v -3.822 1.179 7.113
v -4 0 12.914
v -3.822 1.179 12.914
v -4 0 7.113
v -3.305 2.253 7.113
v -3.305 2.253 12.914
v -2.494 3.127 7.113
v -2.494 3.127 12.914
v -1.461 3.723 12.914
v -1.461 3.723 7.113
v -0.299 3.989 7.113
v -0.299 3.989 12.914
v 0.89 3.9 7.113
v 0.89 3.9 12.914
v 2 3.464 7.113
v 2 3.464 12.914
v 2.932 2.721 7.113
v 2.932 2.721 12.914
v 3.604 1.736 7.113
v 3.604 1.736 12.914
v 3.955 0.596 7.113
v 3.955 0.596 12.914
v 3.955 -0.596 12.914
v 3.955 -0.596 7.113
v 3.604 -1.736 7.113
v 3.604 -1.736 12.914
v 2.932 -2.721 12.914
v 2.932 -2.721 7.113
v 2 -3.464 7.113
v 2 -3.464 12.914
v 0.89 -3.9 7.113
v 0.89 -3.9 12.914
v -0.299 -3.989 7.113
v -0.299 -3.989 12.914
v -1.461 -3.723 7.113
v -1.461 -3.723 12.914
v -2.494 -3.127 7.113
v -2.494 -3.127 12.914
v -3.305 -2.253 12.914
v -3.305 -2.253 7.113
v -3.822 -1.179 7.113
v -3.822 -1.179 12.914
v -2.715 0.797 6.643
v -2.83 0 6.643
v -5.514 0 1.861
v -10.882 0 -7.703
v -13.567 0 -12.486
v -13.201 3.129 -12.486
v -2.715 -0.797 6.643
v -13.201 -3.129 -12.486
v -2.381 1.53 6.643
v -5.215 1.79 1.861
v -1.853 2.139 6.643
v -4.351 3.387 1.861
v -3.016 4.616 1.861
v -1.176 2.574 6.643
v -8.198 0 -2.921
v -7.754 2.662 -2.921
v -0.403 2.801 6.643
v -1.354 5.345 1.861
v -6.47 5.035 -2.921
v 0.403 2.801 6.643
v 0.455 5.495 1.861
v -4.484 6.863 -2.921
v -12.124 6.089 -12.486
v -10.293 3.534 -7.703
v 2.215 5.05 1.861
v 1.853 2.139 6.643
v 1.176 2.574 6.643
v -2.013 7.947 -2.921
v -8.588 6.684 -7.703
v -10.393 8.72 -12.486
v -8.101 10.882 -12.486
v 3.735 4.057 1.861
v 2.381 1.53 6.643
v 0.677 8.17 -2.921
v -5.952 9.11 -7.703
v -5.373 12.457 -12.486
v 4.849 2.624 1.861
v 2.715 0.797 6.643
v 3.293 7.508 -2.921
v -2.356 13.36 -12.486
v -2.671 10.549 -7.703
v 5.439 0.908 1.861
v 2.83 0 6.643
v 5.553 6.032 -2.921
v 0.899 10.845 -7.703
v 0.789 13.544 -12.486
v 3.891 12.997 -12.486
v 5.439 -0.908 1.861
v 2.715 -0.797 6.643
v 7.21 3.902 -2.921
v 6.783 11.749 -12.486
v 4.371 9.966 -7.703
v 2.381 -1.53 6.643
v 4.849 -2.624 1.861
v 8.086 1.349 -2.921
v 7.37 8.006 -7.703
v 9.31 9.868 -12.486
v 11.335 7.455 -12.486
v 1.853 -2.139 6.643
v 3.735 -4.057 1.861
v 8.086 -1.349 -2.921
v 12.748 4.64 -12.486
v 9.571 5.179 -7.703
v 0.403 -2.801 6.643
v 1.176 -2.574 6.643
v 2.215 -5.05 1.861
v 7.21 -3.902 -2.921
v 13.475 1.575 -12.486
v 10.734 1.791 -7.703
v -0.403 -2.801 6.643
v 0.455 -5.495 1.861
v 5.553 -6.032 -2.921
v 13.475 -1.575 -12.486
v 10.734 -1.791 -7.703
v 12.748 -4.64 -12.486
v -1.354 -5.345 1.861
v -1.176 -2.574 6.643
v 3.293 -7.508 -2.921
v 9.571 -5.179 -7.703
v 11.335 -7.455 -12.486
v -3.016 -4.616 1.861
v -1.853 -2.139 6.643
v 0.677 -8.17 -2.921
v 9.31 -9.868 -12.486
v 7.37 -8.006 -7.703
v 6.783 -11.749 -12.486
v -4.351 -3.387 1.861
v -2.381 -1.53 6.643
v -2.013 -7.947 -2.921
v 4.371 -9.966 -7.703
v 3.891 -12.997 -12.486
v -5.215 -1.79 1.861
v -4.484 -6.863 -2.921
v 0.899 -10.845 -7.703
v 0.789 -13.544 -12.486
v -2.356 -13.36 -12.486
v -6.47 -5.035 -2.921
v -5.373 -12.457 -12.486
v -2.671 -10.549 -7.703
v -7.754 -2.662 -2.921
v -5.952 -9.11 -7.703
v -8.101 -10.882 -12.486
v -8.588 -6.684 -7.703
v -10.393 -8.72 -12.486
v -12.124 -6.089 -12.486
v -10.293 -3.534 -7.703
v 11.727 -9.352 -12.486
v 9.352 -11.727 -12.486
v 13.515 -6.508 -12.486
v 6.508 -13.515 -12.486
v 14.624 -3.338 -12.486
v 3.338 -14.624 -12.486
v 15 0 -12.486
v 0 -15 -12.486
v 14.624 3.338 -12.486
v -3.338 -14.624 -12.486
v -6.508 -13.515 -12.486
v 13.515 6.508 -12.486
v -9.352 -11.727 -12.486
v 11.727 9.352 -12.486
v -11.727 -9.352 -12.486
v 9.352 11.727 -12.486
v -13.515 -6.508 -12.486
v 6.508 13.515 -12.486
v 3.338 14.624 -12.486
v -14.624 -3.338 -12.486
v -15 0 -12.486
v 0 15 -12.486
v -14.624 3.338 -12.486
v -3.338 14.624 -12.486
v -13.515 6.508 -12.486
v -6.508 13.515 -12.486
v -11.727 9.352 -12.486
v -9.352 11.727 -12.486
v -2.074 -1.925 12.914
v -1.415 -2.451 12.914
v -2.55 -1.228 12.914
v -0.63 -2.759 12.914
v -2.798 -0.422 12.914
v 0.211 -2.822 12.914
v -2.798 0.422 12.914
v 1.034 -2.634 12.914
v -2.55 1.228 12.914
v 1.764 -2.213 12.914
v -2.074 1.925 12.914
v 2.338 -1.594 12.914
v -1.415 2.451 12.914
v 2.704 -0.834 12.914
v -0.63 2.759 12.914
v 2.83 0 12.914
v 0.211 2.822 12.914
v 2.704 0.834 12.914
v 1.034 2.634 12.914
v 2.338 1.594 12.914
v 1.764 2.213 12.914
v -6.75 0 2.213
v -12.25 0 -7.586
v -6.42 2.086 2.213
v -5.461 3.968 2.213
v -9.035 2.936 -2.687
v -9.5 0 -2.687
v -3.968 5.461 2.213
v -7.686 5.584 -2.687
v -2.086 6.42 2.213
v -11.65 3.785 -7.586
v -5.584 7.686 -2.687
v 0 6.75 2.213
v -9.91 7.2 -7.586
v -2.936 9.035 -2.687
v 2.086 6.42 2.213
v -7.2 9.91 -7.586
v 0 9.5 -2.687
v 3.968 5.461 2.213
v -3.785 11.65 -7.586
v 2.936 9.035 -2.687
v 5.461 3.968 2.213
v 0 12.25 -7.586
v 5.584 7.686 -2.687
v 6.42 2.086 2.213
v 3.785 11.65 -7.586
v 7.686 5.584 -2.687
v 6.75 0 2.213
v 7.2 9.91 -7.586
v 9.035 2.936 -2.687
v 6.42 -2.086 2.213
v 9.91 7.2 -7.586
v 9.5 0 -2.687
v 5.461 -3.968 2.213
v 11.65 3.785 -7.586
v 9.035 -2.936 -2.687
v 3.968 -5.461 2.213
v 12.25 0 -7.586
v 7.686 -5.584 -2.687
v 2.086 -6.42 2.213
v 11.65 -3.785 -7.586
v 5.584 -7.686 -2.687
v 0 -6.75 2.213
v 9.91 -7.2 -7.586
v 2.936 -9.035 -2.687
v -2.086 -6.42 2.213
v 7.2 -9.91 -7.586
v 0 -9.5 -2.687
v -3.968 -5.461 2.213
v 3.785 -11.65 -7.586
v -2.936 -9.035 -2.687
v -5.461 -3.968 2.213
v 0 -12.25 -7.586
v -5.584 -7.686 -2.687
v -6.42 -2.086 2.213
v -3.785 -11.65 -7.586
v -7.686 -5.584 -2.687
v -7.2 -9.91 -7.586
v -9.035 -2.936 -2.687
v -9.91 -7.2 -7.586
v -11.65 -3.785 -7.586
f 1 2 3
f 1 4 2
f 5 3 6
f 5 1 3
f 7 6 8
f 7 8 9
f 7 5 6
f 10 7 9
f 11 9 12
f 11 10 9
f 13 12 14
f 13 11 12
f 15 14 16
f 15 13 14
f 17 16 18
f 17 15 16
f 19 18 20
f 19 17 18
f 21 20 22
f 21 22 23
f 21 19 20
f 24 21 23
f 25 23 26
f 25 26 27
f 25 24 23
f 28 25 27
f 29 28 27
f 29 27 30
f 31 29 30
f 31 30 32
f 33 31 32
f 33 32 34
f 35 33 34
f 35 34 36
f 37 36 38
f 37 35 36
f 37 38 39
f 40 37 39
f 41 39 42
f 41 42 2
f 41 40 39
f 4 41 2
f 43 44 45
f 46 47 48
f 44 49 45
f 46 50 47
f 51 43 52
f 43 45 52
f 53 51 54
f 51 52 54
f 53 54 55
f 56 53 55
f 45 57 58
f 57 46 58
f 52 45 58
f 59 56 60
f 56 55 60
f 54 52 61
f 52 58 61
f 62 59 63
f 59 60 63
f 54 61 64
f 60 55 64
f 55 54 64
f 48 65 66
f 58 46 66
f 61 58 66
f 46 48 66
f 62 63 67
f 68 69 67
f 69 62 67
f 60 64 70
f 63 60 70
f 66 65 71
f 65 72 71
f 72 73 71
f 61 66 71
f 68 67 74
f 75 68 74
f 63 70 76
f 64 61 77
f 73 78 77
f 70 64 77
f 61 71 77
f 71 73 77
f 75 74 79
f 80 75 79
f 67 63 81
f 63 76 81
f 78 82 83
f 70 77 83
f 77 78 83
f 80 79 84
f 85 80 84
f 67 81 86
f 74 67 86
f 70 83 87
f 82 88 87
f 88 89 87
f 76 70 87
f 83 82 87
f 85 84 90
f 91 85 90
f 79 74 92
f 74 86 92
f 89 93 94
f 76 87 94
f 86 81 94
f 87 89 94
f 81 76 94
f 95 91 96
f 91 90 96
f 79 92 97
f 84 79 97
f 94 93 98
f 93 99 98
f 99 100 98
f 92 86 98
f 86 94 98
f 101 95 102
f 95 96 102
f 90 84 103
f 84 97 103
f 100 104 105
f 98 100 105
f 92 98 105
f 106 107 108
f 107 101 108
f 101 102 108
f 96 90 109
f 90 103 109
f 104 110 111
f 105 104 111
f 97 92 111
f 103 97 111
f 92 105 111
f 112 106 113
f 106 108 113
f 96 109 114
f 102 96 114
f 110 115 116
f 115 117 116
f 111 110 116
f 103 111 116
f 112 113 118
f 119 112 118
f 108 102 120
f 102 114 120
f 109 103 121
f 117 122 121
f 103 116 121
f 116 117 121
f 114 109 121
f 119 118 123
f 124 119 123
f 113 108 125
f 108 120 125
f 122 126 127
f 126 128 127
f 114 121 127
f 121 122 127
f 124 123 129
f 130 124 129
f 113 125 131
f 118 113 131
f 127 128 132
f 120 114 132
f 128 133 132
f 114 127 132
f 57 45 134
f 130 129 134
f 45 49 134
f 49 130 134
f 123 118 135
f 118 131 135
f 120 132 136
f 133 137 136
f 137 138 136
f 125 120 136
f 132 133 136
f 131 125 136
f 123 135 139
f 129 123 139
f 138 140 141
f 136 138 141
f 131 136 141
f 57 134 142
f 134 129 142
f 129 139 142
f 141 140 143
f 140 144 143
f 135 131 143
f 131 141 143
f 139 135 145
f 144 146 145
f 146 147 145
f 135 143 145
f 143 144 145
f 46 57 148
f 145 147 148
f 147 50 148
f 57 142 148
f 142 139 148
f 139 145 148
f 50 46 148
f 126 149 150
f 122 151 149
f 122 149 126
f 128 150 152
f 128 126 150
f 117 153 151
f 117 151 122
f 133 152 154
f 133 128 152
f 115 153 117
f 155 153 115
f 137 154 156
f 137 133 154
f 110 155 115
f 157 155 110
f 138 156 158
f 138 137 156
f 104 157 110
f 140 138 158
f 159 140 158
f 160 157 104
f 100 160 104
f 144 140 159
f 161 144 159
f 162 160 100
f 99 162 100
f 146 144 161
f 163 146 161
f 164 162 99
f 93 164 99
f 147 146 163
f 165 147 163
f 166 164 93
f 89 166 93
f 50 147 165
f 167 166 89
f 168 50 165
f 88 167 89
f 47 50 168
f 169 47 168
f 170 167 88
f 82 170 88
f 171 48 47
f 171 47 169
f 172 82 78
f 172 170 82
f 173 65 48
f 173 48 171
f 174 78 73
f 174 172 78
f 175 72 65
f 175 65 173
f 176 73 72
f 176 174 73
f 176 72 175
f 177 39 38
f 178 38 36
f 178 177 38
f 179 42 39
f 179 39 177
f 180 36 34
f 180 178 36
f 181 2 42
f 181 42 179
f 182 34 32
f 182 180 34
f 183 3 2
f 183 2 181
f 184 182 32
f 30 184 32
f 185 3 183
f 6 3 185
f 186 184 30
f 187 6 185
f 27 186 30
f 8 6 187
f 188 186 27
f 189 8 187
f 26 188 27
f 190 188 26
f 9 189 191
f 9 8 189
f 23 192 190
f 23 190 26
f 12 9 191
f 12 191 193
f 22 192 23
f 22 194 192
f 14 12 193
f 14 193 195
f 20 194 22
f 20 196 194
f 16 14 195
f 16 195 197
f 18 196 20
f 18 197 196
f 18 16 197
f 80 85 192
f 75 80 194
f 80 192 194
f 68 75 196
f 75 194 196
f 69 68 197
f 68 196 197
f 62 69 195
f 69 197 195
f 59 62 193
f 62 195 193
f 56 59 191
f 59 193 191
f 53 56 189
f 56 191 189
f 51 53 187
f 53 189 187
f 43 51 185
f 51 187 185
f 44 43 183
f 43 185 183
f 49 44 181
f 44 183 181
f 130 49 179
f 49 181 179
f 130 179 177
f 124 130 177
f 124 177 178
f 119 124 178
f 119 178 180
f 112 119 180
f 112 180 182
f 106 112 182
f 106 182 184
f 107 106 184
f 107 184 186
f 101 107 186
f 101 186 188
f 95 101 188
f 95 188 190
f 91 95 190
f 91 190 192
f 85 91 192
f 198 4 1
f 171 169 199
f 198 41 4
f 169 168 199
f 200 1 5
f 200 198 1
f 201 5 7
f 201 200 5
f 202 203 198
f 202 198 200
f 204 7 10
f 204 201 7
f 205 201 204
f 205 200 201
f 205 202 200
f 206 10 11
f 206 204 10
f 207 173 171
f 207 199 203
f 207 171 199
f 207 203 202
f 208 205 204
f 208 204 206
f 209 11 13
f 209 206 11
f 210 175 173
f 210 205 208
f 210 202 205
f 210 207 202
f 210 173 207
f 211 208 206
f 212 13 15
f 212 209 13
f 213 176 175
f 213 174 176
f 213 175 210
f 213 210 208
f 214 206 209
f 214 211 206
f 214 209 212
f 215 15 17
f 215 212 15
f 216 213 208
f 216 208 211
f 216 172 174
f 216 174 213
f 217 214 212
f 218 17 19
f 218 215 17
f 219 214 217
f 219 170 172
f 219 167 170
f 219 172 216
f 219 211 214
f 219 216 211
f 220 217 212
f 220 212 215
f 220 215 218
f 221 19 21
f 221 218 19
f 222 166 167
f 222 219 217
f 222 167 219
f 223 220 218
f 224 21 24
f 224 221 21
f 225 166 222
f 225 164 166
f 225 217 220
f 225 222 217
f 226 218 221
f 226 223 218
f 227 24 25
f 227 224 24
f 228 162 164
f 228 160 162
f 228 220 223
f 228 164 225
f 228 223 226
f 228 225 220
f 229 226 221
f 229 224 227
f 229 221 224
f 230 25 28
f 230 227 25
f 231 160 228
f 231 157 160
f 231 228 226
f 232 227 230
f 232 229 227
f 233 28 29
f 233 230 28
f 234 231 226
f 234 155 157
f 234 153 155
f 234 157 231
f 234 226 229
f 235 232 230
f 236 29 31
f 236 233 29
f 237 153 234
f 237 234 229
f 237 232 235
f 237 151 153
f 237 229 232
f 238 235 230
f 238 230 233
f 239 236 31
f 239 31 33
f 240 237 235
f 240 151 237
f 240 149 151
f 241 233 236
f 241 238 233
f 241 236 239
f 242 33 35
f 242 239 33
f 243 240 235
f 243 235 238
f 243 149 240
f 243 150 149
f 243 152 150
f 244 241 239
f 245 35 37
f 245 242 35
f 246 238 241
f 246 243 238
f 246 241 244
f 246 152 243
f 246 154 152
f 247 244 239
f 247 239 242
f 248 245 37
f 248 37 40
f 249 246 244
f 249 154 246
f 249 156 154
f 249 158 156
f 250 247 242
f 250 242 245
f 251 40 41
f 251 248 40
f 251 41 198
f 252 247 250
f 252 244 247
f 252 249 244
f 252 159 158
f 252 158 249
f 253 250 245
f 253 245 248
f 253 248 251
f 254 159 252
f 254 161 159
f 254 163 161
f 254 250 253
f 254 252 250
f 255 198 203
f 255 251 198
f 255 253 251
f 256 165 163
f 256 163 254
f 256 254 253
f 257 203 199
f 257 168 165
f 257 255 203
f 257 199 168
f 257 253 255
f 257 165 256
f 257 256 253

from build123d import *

# Parameters (mm, degrees)
F2_T     = -1.25
F3_R     = 2.8299175035
F4_DEPTH = 25


with BuildPart() as f1:
    # F0 (on Front) → F1 (revolve)
    with BuildSketch(Plane.XZ):
        Polygon((0, -12.4857185782), (0, 12.9142814218), (-4, 12.9142814218), (-4, 7.1125508785), (-15, -12.4857185782), align=None)
    revolve(axis=Axis((0, 0, 21.6972688213), (0, 0, -1)))

    # F2
    f2_openings = [f1.faces().sort_by_distance(p)[0] for p in [
        (0, 0, -12.485719),
    ]]
    offset(amount=F2_T, openings=f2_openings, kind=Kind.INTERSECTION)

    # F3 (on face) → F4 (cut)
    with BuildSketch(Plane.XY.offset(12.9142814218)):
        Circle(F3_R)
    extrude(amount=-F4_DEPTH, mode=Mode.SUBTRACT)


solid = f1.part
